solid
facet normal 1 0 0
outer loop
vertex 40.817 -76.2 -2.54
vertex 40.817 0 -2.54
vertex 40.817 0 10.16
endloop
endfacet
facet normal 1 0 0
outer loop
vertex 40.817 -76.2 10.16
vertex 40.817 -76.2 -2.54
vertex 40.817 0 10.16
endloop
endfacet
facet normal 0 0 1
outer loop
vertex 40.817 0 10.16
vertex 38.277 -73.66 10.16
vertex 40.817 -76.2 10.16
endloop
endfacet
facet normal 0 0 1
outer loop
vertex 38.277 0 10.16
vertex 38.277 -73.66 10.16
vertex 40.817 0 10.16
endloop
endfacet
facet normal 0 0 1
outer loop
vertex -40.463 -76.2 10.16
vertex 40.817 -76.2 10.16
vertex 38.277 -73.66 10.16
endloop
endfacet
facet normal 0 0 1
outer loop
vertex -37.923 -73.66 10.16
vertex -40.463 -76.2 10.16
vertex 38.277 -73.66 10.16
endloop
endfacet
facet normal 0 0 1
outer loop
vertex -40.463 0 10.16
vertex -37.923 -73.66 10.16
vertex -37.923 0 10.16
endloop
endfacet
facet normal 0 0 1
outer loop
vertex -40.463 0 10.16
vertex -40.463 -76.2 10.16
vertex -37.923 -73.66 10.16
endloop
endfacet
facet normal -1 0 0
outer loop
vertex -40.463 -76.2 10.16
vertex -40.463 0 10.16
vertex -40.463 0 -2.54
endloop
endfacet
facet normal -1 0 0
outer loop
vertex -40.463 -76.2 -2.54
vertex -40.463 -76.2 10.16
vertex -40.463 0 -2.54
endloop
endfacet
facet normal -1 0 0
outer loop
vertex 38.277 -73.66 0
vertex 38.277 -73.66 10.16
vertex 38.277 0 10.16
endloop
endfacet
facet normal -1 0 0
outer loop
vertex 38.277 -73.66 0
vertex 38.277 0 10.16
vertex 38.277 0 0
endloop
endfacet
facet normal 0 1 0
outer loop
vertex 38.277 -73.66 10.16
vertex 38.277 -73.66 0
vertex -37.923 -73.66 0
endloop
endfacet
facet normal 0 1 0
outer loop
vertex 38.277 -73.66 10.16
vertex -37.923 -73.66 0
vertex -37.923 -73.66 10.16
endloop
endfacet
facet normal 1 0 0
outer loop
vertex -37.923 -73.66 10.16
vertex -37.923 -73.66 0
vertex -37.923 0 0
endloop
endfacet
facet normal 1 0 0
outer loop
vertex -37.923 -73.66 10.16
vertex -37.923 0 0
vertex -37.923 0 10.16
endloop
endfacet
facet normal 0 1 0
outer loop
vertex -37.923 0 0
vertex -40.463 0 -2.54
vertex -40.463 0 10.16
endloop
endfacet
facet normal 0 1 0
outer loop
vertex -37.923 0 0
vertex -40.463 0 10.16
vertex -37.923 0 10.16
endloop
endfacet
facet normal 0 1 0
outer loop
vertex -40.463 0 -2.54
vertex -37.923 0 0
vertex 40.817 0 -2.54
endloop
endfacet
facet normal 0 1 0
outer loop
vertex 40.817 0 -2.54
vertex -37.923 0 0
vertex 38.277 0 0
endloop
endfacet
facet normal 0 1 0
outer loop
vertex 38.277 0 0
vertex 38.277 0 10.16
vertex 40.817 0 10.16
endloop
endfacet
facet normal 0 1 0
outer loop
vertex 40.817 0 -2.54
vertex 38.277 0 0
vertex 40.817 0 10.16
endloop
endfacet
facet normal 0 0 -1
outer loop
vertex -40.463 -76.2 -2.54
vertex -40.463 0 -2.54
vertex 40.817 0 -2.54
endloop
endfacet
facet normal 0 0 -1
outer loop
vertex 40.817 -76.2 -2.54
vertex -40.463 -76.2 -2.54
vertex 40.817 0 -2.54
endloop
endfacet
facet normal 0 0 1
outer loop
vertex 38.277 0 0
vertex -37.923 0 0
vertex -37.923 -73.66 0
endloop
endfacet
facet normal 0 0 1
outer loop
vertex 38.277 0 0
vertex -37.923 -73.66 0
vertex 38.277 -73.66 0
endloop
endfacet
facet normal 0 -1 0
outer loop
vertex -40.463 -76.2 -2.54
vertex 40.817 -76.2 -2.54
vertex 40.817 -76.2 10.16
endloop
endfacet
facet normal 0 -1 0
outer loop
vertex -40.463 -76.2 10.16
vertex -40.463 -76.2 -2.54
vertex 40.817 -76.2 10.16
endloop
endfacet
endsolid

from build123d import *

# Parameters (mm, degrees)
F0_W     = 76.2
F0_H     = 2.54
F1_DEPTH = 76.2
F2_DEPTH = 76.2
F3_DEPTH = 76.2
F4_W     = 2.54
F4_H     = 10.16
F5_DEPTH = 76.2


with BuildPart() as f1:
    # F0 (on Front) → F1 (new body)
    with BuildSketch(Plane.XZ):
        with Locations((0.177208, -1.27)):
            Rectangle(F0_W, F0_H)
    extrude(amount=F1_DEPTH)

    # F0 (on Front) → F2 (join)
    with BuildSketch(Plane.XZ):
        Polygon((-37.922792, -2.54), (-37.922792, 0), (-37.922792, 10.16), (-40.462792, 10.16), (-40.462792, -2.54), align=None)
    extrude(amount=F2_DEPTH)

    # F0 (on Front) → F3 (join)
    with BuildSketch(Plane.XZ):
        Polygon((38.277208, 10.16), (38.277208, 0), (38.277208, -2.54), (40.817208, -2.54), (40.817208, 10.16), align=None)
    extrude(amount=F3_DEPTH)

    # F4 (on face) → F5 (join)
    with BuildSketch(Plane.YZ.offset(-37.922792)):
        with Locations((-74.93, 5.08)):
            Rectangle(F4_W, F4_H)
    extrude(amount=F5_DEPTH)


solid = f1.part
